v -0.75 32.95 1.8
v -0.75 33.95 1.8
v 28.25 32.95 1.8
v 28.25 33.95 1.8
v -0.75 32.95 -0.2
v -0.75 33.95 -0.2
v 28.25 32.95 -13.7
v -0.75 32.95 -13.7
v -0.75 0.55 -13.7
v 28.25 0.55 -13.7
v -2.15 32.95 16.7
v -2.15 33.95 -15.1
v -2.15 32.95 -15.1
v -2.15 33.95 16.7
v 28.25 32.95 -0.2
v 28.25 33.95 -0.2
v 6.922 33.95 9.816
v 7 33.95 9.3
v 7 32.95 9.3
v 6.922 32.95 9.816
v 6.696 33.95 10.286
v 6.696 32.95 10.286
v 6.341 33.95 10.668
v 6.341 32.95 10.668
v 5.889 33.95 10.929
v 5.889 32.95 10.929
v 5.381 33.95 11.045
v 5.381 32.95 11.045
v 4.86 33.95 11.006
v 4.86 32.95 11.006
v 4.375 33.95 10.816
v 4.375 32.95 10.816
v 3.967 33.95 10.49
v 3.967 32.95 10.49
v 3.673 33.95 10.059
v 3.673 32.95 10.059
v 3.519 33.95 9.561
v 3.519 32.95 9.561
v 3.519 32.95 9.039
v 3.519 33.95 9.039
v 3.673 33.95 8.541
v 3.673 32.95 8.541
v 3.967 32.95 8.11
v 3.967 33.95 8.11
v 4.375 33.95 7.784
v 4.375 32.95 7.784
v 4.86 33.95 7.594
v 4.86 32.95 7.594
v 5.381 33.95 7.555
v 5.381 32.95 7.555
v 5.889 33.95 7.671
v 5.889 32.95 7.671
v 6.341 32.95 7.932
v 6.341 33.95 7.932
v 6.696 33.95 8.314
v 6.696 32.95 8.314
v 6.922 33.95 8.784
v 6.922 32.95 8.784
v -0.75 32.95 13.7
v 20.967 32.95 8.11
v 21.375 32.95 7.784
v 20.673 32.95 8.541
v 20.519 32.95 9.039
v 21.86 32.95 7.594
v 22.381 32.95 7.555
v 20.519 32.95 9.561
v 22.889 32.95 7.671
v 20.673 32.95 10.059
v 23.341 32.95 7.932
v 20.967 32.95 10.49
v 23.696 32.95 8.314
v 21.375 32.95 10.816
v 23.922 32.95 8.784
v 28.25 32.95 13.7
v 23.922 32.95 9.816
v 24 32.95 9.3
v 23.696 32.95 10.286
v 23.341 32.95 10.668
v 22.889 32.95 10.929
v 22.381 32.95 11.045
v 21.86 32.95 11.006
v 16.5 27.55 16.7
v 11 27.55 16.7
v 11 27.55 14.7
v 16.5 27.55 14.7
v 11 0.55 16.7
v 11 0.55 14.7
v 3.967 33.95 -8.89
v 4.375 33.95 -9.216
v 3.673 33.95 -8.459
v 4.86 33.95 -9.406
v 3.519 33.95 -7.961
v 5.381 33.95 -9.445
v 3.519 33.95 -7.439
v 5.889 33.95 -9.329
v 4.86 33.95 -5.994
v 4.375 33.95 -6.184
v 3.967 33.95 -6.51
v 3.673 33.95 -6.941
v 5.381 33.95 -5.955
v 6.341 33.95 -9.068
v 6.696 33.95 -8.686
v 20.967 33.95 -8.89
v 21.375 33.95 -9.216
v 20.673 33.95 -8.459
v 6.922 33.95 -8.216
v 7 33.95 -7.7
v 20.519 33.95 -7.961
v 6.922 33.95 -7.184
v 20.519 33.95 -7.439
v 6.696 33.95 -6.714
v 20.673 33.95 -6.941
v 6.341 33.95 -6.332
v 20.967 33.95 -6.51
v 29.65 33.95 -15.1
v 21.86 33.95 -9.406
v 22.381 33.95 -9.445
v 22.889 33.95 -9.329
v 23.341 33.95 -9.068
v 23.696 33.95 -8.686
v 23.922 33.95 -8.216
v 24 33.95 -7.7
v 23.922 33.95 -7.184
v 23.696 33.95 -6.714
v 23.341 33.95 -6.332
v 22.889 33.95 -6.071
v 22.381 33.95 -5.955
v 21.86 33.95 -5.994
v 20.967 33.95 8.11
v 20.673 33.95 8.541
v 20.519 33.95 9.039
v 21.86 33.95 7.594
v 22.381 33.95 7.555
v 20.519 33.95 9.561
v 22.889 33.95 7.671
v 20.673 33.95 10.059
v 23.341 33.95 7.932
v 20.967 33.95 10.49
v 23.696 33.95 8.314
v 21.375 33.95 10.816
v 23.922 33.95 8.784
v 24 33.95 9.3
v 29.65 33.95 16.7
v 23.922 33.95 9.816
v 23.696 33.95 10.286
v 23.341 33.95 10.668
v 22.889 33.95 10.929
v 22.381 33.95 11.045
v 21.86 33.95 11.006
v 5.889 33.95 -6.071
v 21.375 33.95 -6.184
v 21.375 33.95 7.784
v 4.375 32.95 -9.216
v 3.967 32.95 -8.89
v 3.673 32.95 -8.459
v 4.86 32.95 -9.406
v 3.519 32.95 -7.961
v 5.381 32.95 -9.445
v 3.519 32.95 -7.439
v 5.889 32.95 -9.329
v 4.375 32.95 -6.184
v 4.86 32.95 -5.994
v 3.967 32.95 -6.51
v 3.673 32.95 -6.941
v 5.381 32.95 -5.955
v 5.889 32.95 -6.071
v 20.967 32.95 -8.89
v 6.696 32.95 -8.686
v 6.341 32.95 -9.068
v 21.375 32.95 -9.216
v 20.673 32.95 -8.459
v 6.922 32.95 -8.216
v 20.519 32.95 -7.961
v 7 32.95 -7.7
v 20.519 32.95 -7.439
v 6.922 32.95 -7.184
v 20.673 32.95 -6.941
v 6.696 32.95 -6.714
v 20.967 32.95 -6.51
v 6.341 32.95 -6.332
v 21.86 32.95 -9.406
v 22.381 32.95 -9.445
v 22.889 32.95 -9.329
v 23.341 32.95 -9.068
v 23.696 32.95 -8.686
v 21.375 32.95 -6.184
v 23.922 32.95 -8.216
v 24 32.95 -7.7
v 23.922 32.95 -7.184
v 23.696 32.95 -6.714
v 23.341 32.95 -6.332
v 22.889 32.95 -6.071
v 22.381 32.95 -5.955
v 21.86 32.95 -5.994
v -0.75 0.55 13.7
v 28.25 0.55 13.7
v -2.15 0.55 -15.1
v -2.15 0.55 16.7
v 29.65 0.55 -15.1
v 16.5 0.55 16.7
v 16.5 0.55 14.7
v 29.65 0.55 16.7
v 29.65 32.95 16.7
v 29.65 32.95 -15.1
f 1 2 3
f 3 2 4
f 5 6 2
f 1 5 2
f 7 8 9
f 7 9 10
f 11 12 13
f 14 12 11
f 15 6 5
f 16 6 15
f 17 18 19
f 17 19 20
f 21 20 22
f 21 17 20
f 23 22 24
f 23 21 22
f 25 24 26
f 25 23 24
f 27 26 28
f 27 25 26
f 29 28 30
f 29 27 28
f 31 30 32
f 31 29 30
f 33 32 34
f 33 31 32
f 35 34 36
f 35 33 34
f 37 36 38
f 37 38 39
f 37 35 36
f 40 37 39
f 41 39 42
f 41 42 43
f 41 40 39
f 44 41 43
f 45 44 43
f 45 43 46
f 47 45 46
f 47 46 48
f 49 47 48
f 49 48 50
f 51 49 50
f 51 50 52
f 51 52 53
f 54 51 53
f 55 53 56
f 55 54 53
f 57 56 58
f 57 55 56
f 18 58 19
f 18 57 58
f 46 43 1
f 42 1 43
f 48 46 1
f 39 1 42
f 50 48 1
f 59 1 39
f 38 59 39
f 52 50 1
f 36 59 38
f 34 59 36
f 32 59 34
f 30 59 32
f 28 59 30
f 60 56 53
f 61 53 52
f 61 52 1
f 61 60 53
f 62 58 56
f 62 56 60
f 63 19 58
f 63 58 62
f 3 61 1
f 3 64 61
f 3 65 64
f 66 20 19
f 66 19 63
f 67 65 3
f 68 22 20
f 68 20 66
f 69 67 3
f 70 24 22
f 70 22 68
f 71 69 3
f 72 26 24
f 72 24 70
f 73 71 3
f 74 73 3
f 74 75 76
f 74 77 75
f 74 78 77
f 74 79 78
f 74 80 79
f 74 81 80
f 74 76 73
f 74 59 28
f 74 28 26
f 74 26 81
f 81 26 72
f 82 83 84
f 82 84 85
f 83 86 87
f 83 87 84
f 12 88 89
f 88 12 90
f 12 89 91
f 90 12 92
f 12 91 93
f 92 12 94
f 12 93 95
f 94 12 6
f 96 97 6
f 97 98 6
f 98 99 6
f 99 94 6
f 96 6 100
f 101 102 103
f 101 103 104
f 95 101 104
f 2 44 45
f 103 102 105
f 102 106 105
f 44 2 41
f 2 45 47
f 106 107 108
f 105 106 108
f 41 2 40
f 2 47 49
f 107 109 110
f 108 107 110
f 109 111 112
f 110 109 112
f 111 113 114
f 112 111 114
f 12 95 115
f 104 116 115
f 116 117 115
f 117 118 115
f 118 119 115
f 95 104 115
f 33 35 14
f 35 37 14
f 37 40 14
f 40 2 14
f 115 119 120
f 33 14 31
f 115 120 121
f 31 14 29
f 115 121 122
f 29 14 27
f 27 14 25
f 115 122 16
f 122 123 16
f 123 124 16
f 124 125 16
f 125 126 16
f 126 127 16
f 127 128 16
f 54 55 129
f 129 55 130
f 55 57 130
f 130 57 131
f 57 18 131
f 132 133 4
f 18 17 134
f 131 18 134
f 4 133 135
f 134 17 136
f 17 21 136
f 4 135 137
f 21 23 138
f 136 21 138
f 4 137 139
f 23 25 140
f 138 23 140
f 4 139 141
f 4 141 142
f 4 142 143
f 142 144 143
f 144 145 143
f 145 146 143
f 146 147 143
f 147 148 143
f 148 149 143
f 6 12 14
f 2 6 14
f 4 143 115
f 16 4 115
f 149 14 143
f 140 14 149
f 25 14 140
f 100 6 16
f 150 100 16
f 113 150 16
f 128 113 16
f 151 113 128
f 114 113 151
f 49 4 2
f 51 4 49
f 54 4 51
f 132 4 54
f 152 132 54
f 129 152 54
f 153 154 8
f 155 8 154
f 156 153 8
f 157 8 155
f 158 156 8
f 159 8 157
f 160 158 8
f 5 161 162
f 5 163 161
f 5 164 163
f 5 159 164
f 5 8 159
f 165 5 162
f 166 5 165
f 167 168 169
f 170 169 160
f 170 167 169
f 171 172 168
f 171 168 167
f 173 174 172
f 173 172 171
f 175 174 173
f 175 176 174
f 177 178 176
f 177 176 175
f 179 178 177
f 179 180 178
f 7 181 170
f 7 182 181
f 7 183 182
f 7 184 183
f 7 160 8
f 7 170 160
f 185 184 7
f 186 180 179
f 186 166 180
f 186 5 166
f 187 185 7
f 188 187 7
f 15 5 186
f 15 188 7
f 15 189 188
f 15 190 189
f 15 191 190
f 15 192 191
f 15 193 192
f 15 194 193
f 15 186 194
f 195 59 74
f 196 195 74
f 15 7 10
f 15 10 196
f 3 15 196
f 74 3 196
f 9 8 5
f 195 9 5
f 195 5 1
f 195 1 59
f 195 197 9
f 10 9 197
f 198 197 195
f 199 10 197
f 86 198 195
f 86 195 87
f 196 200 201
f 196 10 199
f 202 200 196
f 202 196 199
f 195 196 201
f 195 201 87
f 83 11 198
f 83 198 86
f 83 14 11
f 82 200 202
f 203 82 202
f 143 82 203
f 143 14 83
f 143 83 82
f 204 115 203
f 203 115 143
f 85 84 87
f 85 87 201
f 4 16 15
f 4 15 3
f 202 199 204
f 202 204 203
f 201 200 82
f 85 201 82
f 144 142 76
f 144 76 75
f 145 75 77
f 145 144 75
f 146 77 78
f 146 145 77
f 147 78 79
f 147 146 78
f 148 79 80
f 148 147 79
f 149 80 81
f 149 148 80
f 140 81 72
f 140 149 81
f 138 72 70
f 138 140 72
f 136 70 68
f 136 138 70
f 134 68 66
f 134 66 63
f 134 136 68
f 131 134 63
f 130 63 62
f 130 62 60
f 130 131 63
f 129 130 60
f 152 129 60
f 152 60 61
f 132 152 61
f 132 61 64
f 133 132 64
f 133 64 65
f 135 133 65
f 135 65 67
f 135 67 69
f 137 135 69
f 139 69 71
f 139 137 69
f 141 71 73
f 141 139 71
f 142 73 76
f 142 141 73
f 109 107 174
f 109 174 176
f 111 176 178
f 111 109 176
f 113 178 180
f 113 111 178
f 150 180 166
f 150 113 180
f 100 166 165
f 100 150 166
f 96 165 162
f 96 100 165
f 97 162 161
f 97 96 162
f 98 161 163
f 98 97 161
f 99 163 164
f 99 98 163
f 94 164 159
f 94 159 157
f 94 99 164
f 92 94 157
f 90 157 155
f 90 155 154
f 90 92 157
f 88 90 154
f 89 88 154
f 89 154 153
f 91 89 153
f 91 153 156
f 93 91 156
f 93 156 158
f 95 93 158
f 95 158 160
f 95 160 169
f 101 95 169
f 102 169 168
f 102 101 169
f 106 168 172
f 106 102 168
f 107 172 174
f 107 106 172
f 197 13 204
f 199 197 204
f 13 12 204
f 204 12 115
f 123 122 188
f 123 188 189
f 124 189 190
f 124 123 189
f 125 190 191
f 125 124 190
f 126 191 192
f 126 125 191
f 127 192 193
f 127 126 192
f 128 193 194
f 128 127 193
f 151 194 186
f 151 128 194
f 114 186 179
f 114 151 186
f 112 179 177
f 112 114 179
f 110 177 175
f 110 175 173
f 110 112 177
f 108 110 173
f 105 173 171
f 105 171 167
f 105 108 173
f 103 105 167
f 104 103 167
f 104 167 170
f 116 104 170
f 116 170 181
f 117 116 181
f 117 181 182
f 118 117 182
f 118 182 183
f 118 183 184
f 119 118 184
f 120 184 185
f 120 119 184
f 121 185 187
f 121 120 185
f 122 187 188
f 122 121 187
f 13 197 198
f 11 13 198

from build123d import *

# Parameters (mm, degrees)
SKETCH013_W     = 31.8
SKETCH013_H     = 31.8
SKETCH013_R     = 1.75
SKETCH013_W_2   = 29.000001
SKETCH013_H_2   = 2
PAD005_DEPTH    = 1
SKETCH014_W     = 31.8
SKETCH014_H     = 31.8
SKETCH014_W_2   = 29
SKETCH014_H_2   = 27.4
PAD006_DEPTH    = 32.4
SKETCH024_W     = 5.5
SKETCH024_H     = 27
POCKET010_DEPTH = 2


with BuildPart() as part:
    # Sketch013 (on Face2 of Binder003) → Pad005 (new body)
    with BuildSketch(Plane.XZ.offset(-33.95)):
        with Locations((13.749781, 0.8)):
            Rectangle(SKETCH013_W, SKETCH013_H)
        with Locations((5.24978, 9.3)):
            Circle(SKETCH013_R, mode=Mode.SUBTRACT)
        with Locations((22.24978, 9.3)):
            Circle(SKETCH013_R, mode=Mode.SUBTRACT)
        with Locations((22.24978, -7.7)):
            Circle(SKETCH013_R, mode=Mode.SUBTRACT)
        with Locations((5.24978, -7.7)):
            Circle(SKETCH013_R, mode=Mode.SUBTRACT)
        with Locations((13.74978, 0.8)):
            Rectangle(SKETCH013_W_2, SKETCH013_H_2, mode=Mode.SUBTRACT)
    extrude(amount=PAD005_DEPTH)

    # Sketch014 (on Face14 of Pad005) → Pad006 (join)
    with BuildSketch(Plane.XZ.offset(-32.95)):
        with Locations((13.74978, 0.8)):
            Rectangle(SKETCH014_W, SKETCH014_H)
        with Locations((13.74978, 0)):
            Rectangle(SKETCH014_W_2, SKETCH014_H_2, mode=Mode.SUBTRACT)
    extrude(amount=PAD006_DEPTH)

    # Sketch024 (on Face14 of Pad006) → Pocket010 (cut)
    with BuildSketch(Plane.XY.offset(16.7)):
        with Locations((13.74978, 14.05)):
            Rectangle(SKETCH024_W, SKETCH024_H)
    extrude(amount=-POCKET010_DEPTH, mode=Mode.SUBTRACT)


solid = part.part
